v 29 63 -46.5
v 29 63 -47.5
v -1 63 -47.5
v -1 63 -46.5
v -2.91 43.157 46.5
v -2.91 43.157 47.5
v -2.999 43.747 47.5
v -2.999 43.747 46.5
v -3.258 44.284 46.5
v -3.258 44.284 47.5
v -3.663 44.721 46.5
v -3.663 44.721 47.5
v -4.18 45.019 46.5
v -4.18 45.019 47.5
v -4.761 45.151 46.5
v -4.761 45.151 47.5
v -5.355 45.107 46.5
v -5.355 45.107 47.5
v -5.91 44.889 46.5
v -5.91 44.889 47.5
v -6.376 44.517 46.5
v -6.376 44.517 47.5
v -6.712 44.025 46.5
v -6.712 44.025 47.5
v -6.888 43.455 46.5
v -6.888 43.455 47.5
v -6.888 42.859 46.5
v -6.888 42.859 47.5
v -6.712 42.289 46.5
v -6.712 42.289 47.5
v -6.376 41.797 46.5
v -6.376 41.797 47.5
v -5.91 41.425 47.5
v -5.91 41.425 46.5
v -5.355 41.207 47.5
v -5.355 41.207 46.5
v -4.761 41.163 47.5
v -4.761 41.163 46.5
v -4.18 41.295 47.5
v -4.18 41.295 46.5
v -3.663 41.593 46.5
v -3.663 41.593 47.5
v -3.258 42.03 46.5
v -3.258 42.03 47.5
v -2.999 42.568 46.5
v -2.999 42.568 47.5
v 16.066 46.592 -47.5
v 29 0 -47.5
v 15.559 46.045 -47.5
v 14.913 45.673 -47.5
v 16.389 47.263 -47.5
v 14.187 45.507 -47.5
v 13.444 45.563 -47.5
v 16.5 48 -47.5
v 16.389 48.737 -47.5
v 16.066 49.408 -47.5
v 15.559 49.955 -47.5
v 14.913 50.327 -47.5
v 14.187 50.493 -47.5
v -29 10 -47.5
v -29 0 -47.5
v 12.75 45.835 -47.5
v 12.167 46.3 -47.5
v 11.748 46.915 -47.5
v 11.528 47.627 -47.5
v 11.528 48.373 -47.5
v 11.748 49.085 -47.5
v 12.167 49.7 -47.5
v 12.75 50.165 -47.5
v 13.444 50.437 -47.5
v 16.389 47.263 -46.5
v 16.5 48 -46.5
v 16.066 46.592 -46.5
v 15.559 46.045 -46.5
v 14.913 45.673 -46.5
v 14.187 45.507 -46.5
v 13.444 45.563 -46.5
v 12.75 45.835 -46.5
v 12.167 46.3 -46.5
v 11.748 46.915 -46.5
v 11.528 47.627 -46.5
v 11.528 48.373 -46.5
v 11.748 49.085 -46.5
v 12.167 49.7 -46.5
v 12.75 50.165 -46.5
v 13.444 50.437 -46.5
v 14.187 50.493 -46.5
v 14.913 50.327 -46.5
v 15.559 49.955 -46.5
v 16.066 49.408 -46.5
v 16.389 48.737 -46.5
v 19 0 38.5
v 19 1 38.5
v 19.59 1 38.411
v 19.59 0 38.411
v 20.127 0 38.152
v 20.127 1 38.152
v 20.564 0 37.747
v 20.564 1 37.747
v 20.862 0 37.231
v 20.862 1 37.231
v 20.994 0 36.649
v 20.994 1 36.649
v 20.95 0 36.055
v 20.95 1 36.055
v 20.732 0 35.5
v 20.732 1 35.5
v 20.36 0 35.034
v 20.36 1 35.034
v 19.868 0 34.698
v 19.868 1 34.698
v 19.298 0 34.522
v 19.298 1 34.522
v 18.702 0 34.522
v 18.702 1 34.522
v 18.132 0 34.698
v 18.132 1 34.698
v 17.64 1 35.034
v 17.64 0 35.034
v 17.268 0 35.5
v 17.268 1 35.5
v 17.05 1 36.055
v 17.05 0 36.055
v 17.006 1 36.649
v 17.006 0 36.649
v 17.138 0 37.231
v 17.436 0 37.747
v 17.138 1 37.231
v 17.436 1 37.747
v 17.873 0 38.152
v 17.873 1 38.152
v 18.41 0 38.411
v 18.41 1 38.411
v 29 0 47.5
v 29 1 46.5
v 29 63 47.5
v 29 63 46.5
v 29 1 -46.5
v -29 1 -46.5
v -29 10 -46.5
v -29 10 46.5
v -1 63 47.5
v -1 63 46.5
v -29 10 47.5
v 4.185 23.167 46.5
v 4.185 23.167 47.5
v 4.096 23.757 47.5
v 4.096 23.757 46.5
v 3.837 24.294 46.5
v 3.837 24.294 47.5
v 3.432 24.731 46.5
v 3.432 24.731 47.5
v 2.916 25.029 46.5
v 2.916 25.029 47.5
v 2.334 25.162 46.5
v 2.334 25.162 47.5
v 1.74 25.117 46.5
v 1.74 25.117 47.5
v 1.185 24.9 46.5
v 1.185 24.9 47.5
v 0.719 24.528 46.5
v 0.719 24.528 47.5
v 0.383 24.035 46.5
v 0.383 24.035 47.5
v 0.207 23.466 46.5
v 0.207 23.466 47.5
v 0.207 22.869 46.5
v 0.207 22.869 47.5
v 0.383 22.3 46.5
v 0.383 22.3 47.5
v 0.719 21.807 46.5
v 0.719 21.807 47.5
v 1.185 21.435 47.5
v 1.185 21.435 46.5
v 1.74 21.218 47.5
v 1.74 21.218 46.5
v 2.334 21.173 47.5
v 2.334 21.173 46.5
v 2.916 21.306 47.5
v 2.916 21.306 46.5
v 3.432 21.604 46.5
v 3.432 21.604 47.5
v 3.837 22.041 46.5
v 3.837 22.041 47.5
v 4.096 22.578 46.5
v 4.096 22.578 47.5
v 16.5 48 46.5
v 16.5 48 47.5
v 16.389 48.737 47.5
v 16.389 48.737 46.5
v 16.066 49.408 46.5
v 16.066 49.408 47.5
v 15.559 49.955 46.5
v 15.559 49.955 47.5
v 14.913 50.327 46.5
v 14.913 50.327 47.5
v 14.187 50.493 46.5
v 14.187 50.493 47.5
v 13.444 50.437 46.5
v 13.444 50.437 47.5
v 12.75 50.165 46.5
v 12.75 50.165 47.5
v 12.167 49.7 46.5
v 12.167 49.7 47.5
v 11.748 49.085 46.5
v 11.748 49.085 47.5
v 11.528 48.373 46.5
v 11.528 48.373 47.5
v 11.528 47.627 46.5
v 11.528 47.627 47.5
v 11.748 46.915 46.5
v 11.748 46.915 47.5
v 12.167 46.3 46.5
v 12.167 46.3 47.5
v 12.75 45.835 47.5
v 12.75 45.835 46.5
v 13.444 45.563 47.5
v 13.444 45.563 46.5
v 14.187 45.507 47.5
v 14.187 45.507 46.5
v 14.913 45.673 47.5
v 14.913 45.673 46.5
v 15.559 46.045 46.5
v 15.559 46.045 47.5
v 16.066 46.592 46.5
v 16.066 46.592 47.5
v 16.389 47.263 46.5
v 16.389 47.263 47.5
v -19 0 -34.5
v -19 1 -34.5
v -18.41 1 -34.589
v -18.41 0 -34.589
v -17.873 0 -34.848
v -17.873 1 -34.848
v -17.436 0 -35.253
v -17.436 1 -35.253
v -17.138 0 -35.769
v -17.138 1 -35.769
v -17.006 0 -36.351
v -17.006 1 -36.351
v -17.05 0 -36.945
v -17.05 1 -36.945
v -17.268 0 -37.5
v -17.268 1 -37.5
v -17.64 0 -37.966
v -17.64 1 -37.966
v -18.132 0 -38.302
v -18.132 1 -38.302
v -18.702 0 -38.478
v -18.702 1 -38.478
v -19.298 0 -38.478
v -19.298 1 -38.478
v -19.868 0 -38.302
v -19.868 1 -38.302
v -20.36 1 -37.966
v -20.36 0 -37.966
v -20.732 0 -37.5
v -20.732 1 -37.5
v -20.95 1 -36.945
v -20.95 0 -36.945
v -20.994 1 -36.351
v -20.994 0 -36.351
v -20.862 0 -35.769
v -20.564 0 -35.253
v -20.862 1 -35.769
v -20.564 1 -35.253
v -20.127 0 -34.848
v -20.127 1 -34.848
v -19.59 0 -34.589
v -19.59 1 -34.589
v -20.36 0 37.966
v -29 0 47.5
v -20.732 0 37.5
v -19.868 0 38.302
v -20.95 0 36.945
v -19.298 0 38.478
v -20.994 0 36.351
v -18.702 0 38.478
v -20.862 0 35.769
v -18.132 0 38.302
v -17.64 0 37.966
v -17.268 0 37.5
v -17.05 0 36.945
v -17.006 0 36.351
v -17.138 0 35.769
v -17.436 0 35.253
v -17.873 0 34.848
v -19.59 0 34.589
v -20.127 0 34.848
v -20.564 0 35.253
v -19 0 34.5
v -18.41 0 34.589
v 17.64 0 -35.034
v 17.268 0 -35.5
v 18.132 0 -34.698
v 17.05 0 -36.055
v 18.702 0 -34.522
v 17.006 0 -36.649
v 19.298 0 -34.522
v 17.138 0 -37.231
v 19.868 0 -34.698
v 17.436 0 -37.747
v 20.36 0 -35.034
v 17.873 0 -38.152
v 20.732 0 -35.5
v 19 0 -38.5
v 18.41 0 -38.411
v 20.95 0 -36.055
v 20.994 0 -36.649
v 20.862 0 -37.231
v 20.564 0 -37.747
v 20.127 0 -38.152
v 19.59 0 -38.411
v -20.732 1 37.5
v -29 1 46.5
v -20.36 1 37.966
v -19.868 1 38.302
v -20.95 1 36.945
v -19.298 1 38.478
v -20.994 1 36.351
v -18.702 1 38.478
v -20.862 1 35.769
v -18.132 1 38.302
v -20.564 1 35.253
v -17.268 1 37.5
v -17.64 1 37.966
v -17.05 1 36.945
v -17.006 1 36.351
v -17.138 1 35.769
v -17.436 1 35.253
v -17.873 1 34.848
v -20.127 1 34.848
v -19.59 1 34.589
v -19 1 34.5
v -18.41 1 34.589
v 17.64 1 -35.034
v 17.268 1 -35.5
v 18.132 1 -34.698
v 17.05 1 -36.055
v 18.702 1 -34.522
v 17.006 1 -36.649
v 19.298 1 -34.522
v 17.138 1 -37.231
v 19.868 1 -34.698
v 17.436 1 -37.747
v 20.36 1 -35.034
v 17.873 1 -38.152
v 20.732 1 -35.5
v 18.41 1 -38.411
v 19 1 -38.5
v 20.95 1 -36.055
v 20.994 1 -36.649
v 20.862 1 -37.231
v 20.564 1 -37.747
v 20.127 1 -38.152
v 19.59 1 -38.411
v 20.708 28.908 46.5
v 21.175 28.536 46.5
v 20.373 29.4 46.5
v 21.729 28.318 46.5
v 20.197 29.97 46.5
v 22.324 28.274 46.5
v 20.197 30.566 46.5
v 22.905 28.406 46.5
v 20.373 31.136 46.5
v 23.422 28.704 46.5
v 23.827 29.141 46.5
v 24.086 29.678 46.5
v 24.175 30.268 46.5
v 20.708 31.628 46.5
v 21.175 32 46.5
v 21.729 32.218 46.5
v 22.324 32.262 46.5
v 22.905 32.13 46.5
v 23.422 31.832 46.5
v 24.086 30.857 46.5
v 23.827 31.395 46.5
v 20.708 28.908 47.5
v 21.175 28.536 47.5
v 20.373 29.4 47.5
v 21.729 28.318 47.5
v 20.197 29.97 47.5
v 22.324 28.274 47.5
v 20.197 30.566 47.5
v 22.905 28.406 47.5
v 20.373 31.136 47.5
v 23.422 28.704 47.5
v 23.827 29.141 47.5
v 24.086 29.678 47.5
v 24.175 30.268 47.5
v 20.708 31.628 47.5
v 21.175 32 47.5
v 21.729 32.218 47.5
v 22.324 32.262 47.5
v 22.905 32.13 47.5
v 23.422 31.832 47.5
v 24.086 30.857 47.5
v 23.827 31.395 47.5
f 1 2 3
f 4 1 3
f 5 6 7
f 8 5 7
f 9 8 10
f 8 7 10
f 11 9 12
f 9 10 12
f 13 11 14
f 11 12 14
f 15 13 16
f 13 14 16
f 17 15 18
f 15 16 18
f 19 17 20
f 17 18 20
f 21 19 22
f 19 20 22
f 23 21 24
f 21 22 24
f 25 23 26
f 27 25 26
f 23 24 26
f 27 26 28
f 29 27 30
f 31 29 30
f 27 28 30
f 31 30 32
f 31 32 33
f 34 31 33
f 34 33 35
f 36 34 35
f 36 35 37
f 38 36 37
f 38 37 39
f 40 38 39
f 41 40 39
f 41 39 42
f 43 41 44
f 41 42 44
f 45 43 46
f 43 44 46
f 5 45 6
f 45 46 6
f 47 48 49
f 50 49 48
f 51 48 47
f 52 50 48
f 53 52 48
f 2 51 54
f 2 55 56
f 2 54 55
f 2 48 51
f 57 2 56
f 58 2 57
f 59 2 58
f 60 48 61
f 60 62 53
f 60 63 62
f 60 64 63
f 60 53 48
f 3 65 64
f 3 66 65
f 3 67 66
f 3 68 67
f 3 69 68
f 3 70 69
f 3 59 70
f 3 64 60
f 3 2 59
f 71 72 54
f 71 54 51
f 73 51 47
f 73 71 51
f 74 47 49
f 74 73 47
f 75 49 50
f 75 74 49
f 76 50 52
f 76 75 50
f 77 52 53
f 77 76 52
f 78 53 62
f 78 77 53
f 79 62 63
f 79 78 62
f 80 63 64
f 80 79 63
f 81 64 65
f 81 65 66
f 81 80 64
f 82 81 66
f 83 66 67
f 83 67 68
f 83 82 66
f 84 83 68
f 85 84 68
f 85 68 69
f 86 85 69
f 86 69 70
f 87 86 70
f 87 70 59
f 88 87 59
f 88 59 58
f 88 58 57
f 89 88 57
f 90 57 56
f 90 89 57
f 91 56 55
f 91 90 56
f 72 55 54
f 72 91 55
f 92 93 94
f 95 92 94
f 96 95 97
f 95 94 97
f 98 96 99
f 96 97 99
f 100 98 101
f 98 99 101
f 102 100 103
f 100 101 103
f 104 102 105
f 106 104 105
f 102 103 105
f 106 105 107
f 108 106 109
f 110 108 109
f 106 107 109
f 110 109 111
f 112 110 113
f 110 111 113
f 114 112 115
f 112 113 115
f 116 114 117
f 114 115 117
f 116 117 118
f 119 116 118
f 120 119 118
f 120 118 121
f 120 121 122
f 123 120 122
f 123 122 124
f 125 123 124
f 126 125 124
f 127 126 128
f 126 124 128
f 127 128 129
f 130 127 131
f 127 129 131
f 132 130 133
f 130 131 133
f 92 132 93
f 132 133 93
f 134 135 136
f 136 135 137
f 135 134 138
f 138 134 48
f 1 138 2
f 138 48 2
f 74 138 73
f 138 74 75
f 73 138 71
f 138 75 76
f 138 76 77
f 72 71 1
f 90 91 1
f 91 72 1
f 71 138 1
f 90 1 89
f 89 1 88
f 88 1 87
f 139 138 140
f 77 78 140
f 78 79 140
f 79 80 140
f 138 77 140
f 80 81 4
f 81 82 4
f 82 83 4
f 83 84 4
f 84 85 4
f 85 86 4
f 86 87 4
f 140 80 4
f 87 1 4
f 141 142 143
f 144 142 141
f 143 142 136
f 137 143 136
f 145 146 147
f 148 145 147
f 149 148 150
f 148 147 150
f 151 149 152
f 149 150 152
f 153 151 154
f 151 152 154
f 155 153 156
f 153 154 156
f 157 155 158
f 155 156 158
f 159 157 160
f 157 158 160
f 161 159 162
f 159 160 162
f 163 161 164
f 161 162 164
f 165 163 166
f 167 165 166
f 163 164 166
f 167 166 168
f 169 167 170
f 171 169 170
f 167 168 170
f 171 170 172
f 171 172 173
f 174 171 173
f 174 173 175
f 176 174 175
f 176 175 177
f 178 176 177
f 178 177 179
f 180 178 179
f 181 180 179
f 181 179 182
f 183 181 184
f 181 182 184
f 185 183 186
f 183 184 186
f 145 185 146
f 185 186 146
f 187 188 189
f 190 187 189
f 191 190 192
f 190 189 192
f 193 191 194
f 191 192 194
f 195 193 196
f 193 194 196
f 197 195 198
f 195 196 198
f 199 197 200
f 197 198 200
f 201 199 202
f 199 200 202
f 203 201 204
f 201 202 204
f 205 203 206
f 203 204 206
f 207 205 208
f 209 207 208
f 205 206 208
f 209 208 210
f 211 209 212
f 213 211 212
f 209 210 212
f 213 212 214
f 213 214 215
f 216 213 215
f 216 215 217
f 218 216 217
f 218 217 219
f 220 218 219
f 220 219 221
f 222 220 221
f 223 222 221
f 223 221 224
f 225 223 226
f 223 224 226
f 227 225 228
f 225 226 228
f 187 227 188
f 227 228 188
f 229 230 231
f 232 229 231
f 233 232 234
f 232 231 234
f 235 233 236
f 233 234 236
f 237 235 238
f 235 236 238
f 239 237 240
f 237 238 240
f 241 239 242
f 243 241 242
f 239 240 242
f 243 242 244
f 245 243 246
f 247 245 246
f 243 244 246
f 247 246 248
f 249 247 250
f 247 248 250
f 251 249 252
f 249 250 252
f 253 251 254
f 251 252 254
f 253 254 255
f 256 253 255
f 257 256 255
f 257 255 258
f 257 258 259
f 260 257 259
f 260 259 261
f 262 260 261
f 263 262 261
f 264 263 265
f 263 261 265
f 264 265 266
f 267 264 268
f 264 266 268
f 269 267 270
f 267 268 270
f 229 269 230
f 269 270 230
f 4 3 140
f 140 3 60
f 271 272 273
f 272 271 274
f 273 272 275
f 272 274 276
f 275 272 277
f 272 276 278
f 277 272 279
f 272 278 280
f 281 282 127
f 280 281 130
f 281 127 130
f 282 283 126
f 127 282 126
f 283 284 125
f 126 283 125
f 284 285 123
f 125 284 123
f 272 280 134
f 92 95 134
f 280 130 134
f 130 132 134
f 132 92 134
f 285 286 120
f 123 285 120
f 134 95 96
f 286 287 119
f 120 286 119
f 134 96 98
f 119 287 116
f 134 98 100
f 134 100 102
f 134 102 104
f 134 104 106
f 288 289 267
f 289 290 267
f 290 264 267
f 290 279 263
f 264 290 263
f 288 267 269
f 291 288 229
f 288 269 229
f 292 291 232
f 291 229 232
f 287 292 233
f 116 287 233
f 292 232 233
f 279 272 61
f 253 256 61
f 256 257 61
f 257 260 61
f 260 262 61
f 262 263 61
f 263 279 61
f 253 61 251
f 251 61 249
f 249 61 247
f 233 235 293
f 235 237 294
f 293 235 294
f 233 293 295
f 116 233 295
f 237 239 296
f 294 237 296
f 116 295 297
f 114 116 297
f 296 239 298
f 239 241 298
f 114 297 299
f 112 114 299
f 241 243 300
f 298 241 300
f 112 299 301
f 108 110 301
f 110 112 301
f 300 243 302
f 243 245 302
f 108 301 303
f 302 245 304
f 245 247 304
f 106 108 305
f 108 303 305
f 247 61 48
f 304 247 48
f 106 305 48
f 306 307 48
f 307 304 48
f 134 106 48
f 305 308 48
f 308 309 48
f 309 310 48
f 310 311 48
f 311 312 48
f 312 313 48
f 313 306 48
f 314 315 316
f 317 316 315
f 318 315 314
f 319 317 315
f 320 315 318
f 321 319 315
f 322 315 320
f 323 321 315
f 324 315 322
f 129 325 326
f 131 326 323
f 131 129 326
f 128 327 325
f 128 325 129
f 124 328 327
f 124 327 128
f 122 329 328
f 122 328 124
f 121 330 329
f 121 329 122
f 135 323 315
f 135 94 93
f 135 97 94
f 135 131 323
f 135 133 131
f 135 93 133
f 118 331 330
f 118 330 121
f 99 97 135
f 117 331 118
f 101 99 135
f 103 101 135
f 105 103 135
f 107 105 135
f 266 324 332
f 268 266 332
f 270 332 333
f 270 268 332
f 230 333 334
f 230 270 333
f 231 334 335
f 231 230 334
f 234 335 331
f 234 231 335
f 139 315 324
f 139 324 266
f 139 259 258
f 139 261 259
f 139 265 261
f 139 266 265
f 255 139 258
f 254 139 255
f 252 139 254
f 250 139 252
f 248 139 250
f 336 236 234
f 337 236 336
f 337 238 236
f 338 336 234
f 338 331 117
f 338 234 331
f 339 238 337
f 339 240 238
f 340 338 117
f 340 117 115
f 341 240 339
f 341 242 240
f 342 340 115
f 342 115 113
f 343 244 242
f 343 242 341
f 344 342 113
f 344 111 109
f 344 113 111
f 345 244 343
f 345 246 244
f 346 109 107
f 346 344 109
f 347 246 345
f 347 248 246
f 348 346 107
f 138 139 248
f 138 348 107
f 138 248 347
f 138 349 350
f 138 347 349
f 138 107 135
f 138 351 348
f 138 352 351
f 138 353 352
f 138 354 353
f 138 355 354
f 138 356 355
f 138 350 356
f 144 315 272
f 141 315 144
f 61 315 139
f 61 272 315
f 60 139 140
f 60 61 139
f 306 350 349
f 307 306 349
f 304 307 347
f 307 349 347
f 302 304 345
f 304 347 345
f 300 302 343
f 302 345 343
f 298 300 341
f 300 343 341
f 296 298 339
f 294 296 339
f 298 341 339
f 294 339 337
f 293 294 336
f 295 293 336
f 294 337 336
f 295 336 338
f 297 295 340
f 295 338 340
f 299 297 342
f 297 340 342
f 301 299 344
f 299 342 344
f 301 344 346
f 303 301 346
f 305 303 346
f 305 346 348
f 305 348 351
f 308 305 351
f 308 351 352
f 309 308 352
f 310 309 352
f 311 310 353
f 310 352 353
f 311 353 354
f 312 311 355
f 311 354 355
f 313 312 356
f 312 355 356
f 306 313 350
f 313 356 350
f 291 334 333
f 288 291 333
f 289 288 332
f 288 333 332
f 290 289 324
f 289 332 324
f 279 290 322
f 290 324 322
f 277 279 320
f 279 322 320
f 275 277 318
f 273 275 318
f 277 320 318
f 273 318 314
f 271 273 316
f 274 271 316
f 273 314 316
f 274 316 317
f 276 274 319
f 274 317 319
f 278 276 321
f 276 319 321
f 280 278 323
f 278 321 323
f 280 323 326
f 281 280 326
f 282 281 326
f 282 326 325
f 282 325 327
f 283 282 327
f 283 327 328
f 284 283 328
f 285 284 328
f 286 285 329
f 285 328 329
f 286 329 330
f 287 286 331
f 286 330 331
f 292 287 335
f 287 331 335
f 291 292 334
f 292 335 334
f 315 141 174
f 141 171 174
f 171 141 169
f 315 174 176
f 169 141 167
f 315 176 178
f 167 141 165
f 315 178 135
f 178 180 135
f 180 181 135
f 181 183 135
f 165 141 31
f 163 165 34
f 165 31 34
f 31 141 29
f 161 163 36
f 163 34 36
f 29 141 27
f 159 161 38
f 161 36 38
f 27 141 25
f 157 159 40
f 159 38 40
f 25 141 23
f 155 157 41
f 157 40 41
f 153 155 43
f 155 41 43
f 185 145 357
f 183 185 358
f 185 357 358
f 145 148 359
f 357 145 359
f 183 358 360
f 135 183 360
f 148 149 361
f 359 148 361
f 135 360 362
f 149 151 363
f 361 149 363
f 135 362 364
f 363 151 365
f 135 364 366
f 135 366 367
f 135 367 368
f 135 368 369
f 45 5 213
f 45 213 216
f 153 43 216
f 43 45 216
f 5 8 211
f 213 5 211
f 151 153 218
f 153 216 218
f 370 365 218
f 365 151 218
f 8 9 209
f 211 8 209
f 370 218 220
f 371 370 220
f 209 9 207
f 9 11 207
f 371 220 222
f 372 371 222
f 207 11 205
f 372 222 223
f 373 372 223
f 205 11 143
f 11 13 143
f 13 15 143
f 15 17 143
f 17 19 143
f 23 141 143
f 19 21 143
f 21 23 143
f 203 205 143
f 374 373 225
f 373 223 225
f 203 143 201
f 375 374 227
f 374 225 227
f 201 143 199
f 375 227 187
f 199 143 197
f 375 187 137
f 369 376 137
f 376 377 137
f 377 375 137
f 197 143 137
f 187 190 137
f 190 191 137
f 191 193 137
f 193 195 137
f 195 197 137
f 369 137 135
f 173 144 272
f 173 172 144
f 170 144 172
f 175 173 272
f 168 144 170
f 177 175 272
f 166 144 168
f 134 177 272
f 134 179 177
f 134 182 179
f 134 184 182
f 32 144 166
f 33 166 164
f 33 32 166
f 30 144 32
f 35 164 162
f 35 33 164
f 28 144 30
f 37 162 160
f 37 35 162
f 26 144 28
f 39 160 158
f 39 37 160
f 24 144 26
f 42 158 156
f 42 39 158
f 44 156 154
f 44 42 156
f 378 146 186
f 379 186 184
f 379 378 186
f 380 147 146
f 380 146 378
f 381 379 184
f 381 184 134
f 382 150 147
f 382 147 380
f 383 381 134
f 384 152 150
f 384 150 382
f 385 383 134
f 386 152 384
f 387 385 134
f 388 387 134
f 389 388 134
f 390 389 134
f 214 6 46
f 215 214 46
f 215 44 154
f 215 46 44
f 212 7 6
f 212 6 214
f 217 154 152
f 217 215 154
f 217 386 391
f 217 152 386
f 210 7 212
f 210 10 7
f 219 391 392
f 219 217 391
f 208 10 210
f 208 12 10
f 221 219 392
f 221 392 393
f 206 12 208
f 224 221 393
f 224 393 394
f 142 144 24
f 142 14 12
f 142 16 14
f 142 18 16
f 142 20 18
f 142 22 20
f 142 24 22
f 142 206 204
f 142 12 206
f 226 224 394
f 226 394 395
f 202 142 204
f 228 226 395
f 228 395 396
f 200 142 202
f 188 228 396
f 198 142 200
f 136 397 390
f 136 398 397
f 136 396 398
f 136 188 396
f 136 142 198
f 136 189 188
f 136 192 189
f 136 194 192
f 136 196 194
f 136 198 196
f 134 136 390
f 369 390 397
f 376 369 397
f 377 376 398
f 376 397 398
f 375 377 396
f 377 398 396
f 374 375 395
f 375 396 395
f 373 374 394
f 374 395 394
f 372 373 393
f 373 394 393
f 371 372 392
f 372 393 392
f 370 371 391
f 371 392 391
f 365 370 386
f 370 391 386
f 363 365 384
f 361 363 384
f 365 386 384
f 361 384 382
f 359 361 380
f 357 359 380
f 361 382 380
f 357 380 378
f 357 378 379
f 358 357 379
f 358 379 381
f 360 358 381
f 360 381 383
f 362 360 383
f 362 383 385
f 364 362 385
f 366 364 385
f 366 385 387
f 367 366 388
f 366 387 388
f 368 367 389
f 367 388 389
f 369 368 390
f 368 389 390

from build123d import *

# Parameters (mm, degrees)
CROQUIS1_W              = 58
CROQUIS1_H              = 95
SALIENTE_EXTRUIR4_DEPTH = 1
CROQUIS3_W              = 58
CROQUIS3_H              = 62
SALIENTE_EXTRUIR5_DEPTH = 1
CROQUIS4_W              = 58
CROQUIS4_H              = 62
SALIENTE_EXTRUIR6_DEPTH = 1
CORTAR_EXTRUIR4_DEPTH   = 1
CORTAR_EXTRUIR5_DEPTH   = 1
CROQUIS8_R              = 2.5
CORTAR_EXTRUIR6_DEPTH   = 1
CORTAR_EXTRUIR7_START   = -1
CROQUIS9_R              = 2.5
CORTAR_EXTRUIR7_DEPTH   = 1
CROQUIS10_R             = 2
CORTAR_EXTRUIR8_DEPTH   = 1
CROQUIS11_R             = 2
CORTAR_EXTRUIR9_DEPTH   = 1


with BuildPart() as part:
    # Croquis1 → Saliente-Extruir4 (new body)
    with BuildSketch(Plane(origin=(0, 0, 0), x_dir=(1, 0, 0), z_dir=(0, 1, 0))):
        Rectangle(CROQUIS1_W, CROQUIS1_H)
    extrude(amount=SALIENTE_EXTRUIR4_DEPTH)

    # Croquis3 → Saliente-Extruir5 (add)
    with BuildSketch(Plane.XY.offset(47.5)):
        with Locations((0, 32)):
            Rectangle(CROQUIS3_W, CROQUIS3_H)
    extrude(amount=-SALIENTE_EXTRUIR5_DEPTH)

    # Croquis4 → Saliente-Extruir6 (add)
    with BuildSketch(Plane(origin=(0, 0, -47.5), x_dir=(-1, 0, 0), z_dir=(0, 0, -1))):
        with Locations((0, 32)):
            Rectangle(CROQUIS4_W, CROQUIS4_H)
    extrude(amount=-SALIENTE_EXTRUIR6_DEPTH)

    # Croquis6 → Cortar-Extruir4 (cut)
    with BuildSketch(Plane(origin=(0, 0, -47.5), x_dir=(-1, 0, 0), z_dir=(0, 0, -1))):
        Polygon((1, 63), (29, 10), (29, 63), align=None)
    extrude(amount=-CORTAR_EXTRUIR4_DEPTH, mode=Mode.SUBTRACT)

    # Croquis7 → Cortar-Extruir5 (cut)
    with BuildSketch(Plane.XY.offset(47.5)):
        Polygon((-1, 63), (-29, 10), (-29, 63), align=None)
    extrude(amount=-CORTAR_EXTRUIR5_DEPTH, mode=Mode.SUBTRACT)

    # Croquis8 → Cortar-Extruir6 (cut)
    with BuildSketch(Plane.XY.offset(47.5)):
        with Locations((14, 48)):
            Circle(CROQUIS8_R)
    extrude(amount=-CORTAR_EXTRUIR6_DEPTH, mode=Mode.SUBTRACT)

    # Croquis9 → Cortar-Extruir7 (cut)
    with BuildSketch(Plane(origin=(0, 0, -47.5), x_dir=(-1, 0, 0), z_dir=(0, 0, -1)).offset(CORTAR_EXTRUIR7_START)):
        with Locations(Location((-14, 48, 0), (0, 0, 180))):
            Circle(CROQUIS9_R)
    extrude(amount=CORTAR_EXTRUIR7_DEPTH, mode=Mode.SUBTRACT)

    # Croquis10 → Cortar-Extruir8 (cut)
    with BuildSketch(Plane.XY.offset(47.5)):
        with Locations((-4.910218483, 43.157065968)):
            Circle(CROQUIS10_R)
        with Locations((2.184940403, 23.167473614)):
            Circle(CROQUIS10_R)
        with Locations((22.174532757, 30.267910044)):
            Circle(CROQUIS10_R)
    extrude(amount=-CORTAR_EXTRUIR8_DEPTH, mode=Mode.SUBTRACT)

    # Croquis11 → Cortar-Extruir9 (cut)
    with BuildSketch(Plane(origin=(0, 1, 0), x_dir=(1, 0, 0), z_dir=(0, 1, 0))):
        with Locations(Location((-19, 36.5, 0), (0, 0, 270))):
            Circle(CROQUIS11_R)
        with Locations(Location((19, 36.5, 0), (0, 0, 90))):
            Circle(CROQUIS11_R)
        with Locations(Location((19, -36.5, 0), (0, 0, 270))):
            Circle(CROQUIS11_R)
        with Locations(Location((-19, -36.5, 0), (0, 0, 90))):
            Circle(CROQUIS11_R)
    extrude(amount=-CORTAR_EXTRUIR9_DEPTH, mode=Mode.SUBTRACT)


solid = part.part
